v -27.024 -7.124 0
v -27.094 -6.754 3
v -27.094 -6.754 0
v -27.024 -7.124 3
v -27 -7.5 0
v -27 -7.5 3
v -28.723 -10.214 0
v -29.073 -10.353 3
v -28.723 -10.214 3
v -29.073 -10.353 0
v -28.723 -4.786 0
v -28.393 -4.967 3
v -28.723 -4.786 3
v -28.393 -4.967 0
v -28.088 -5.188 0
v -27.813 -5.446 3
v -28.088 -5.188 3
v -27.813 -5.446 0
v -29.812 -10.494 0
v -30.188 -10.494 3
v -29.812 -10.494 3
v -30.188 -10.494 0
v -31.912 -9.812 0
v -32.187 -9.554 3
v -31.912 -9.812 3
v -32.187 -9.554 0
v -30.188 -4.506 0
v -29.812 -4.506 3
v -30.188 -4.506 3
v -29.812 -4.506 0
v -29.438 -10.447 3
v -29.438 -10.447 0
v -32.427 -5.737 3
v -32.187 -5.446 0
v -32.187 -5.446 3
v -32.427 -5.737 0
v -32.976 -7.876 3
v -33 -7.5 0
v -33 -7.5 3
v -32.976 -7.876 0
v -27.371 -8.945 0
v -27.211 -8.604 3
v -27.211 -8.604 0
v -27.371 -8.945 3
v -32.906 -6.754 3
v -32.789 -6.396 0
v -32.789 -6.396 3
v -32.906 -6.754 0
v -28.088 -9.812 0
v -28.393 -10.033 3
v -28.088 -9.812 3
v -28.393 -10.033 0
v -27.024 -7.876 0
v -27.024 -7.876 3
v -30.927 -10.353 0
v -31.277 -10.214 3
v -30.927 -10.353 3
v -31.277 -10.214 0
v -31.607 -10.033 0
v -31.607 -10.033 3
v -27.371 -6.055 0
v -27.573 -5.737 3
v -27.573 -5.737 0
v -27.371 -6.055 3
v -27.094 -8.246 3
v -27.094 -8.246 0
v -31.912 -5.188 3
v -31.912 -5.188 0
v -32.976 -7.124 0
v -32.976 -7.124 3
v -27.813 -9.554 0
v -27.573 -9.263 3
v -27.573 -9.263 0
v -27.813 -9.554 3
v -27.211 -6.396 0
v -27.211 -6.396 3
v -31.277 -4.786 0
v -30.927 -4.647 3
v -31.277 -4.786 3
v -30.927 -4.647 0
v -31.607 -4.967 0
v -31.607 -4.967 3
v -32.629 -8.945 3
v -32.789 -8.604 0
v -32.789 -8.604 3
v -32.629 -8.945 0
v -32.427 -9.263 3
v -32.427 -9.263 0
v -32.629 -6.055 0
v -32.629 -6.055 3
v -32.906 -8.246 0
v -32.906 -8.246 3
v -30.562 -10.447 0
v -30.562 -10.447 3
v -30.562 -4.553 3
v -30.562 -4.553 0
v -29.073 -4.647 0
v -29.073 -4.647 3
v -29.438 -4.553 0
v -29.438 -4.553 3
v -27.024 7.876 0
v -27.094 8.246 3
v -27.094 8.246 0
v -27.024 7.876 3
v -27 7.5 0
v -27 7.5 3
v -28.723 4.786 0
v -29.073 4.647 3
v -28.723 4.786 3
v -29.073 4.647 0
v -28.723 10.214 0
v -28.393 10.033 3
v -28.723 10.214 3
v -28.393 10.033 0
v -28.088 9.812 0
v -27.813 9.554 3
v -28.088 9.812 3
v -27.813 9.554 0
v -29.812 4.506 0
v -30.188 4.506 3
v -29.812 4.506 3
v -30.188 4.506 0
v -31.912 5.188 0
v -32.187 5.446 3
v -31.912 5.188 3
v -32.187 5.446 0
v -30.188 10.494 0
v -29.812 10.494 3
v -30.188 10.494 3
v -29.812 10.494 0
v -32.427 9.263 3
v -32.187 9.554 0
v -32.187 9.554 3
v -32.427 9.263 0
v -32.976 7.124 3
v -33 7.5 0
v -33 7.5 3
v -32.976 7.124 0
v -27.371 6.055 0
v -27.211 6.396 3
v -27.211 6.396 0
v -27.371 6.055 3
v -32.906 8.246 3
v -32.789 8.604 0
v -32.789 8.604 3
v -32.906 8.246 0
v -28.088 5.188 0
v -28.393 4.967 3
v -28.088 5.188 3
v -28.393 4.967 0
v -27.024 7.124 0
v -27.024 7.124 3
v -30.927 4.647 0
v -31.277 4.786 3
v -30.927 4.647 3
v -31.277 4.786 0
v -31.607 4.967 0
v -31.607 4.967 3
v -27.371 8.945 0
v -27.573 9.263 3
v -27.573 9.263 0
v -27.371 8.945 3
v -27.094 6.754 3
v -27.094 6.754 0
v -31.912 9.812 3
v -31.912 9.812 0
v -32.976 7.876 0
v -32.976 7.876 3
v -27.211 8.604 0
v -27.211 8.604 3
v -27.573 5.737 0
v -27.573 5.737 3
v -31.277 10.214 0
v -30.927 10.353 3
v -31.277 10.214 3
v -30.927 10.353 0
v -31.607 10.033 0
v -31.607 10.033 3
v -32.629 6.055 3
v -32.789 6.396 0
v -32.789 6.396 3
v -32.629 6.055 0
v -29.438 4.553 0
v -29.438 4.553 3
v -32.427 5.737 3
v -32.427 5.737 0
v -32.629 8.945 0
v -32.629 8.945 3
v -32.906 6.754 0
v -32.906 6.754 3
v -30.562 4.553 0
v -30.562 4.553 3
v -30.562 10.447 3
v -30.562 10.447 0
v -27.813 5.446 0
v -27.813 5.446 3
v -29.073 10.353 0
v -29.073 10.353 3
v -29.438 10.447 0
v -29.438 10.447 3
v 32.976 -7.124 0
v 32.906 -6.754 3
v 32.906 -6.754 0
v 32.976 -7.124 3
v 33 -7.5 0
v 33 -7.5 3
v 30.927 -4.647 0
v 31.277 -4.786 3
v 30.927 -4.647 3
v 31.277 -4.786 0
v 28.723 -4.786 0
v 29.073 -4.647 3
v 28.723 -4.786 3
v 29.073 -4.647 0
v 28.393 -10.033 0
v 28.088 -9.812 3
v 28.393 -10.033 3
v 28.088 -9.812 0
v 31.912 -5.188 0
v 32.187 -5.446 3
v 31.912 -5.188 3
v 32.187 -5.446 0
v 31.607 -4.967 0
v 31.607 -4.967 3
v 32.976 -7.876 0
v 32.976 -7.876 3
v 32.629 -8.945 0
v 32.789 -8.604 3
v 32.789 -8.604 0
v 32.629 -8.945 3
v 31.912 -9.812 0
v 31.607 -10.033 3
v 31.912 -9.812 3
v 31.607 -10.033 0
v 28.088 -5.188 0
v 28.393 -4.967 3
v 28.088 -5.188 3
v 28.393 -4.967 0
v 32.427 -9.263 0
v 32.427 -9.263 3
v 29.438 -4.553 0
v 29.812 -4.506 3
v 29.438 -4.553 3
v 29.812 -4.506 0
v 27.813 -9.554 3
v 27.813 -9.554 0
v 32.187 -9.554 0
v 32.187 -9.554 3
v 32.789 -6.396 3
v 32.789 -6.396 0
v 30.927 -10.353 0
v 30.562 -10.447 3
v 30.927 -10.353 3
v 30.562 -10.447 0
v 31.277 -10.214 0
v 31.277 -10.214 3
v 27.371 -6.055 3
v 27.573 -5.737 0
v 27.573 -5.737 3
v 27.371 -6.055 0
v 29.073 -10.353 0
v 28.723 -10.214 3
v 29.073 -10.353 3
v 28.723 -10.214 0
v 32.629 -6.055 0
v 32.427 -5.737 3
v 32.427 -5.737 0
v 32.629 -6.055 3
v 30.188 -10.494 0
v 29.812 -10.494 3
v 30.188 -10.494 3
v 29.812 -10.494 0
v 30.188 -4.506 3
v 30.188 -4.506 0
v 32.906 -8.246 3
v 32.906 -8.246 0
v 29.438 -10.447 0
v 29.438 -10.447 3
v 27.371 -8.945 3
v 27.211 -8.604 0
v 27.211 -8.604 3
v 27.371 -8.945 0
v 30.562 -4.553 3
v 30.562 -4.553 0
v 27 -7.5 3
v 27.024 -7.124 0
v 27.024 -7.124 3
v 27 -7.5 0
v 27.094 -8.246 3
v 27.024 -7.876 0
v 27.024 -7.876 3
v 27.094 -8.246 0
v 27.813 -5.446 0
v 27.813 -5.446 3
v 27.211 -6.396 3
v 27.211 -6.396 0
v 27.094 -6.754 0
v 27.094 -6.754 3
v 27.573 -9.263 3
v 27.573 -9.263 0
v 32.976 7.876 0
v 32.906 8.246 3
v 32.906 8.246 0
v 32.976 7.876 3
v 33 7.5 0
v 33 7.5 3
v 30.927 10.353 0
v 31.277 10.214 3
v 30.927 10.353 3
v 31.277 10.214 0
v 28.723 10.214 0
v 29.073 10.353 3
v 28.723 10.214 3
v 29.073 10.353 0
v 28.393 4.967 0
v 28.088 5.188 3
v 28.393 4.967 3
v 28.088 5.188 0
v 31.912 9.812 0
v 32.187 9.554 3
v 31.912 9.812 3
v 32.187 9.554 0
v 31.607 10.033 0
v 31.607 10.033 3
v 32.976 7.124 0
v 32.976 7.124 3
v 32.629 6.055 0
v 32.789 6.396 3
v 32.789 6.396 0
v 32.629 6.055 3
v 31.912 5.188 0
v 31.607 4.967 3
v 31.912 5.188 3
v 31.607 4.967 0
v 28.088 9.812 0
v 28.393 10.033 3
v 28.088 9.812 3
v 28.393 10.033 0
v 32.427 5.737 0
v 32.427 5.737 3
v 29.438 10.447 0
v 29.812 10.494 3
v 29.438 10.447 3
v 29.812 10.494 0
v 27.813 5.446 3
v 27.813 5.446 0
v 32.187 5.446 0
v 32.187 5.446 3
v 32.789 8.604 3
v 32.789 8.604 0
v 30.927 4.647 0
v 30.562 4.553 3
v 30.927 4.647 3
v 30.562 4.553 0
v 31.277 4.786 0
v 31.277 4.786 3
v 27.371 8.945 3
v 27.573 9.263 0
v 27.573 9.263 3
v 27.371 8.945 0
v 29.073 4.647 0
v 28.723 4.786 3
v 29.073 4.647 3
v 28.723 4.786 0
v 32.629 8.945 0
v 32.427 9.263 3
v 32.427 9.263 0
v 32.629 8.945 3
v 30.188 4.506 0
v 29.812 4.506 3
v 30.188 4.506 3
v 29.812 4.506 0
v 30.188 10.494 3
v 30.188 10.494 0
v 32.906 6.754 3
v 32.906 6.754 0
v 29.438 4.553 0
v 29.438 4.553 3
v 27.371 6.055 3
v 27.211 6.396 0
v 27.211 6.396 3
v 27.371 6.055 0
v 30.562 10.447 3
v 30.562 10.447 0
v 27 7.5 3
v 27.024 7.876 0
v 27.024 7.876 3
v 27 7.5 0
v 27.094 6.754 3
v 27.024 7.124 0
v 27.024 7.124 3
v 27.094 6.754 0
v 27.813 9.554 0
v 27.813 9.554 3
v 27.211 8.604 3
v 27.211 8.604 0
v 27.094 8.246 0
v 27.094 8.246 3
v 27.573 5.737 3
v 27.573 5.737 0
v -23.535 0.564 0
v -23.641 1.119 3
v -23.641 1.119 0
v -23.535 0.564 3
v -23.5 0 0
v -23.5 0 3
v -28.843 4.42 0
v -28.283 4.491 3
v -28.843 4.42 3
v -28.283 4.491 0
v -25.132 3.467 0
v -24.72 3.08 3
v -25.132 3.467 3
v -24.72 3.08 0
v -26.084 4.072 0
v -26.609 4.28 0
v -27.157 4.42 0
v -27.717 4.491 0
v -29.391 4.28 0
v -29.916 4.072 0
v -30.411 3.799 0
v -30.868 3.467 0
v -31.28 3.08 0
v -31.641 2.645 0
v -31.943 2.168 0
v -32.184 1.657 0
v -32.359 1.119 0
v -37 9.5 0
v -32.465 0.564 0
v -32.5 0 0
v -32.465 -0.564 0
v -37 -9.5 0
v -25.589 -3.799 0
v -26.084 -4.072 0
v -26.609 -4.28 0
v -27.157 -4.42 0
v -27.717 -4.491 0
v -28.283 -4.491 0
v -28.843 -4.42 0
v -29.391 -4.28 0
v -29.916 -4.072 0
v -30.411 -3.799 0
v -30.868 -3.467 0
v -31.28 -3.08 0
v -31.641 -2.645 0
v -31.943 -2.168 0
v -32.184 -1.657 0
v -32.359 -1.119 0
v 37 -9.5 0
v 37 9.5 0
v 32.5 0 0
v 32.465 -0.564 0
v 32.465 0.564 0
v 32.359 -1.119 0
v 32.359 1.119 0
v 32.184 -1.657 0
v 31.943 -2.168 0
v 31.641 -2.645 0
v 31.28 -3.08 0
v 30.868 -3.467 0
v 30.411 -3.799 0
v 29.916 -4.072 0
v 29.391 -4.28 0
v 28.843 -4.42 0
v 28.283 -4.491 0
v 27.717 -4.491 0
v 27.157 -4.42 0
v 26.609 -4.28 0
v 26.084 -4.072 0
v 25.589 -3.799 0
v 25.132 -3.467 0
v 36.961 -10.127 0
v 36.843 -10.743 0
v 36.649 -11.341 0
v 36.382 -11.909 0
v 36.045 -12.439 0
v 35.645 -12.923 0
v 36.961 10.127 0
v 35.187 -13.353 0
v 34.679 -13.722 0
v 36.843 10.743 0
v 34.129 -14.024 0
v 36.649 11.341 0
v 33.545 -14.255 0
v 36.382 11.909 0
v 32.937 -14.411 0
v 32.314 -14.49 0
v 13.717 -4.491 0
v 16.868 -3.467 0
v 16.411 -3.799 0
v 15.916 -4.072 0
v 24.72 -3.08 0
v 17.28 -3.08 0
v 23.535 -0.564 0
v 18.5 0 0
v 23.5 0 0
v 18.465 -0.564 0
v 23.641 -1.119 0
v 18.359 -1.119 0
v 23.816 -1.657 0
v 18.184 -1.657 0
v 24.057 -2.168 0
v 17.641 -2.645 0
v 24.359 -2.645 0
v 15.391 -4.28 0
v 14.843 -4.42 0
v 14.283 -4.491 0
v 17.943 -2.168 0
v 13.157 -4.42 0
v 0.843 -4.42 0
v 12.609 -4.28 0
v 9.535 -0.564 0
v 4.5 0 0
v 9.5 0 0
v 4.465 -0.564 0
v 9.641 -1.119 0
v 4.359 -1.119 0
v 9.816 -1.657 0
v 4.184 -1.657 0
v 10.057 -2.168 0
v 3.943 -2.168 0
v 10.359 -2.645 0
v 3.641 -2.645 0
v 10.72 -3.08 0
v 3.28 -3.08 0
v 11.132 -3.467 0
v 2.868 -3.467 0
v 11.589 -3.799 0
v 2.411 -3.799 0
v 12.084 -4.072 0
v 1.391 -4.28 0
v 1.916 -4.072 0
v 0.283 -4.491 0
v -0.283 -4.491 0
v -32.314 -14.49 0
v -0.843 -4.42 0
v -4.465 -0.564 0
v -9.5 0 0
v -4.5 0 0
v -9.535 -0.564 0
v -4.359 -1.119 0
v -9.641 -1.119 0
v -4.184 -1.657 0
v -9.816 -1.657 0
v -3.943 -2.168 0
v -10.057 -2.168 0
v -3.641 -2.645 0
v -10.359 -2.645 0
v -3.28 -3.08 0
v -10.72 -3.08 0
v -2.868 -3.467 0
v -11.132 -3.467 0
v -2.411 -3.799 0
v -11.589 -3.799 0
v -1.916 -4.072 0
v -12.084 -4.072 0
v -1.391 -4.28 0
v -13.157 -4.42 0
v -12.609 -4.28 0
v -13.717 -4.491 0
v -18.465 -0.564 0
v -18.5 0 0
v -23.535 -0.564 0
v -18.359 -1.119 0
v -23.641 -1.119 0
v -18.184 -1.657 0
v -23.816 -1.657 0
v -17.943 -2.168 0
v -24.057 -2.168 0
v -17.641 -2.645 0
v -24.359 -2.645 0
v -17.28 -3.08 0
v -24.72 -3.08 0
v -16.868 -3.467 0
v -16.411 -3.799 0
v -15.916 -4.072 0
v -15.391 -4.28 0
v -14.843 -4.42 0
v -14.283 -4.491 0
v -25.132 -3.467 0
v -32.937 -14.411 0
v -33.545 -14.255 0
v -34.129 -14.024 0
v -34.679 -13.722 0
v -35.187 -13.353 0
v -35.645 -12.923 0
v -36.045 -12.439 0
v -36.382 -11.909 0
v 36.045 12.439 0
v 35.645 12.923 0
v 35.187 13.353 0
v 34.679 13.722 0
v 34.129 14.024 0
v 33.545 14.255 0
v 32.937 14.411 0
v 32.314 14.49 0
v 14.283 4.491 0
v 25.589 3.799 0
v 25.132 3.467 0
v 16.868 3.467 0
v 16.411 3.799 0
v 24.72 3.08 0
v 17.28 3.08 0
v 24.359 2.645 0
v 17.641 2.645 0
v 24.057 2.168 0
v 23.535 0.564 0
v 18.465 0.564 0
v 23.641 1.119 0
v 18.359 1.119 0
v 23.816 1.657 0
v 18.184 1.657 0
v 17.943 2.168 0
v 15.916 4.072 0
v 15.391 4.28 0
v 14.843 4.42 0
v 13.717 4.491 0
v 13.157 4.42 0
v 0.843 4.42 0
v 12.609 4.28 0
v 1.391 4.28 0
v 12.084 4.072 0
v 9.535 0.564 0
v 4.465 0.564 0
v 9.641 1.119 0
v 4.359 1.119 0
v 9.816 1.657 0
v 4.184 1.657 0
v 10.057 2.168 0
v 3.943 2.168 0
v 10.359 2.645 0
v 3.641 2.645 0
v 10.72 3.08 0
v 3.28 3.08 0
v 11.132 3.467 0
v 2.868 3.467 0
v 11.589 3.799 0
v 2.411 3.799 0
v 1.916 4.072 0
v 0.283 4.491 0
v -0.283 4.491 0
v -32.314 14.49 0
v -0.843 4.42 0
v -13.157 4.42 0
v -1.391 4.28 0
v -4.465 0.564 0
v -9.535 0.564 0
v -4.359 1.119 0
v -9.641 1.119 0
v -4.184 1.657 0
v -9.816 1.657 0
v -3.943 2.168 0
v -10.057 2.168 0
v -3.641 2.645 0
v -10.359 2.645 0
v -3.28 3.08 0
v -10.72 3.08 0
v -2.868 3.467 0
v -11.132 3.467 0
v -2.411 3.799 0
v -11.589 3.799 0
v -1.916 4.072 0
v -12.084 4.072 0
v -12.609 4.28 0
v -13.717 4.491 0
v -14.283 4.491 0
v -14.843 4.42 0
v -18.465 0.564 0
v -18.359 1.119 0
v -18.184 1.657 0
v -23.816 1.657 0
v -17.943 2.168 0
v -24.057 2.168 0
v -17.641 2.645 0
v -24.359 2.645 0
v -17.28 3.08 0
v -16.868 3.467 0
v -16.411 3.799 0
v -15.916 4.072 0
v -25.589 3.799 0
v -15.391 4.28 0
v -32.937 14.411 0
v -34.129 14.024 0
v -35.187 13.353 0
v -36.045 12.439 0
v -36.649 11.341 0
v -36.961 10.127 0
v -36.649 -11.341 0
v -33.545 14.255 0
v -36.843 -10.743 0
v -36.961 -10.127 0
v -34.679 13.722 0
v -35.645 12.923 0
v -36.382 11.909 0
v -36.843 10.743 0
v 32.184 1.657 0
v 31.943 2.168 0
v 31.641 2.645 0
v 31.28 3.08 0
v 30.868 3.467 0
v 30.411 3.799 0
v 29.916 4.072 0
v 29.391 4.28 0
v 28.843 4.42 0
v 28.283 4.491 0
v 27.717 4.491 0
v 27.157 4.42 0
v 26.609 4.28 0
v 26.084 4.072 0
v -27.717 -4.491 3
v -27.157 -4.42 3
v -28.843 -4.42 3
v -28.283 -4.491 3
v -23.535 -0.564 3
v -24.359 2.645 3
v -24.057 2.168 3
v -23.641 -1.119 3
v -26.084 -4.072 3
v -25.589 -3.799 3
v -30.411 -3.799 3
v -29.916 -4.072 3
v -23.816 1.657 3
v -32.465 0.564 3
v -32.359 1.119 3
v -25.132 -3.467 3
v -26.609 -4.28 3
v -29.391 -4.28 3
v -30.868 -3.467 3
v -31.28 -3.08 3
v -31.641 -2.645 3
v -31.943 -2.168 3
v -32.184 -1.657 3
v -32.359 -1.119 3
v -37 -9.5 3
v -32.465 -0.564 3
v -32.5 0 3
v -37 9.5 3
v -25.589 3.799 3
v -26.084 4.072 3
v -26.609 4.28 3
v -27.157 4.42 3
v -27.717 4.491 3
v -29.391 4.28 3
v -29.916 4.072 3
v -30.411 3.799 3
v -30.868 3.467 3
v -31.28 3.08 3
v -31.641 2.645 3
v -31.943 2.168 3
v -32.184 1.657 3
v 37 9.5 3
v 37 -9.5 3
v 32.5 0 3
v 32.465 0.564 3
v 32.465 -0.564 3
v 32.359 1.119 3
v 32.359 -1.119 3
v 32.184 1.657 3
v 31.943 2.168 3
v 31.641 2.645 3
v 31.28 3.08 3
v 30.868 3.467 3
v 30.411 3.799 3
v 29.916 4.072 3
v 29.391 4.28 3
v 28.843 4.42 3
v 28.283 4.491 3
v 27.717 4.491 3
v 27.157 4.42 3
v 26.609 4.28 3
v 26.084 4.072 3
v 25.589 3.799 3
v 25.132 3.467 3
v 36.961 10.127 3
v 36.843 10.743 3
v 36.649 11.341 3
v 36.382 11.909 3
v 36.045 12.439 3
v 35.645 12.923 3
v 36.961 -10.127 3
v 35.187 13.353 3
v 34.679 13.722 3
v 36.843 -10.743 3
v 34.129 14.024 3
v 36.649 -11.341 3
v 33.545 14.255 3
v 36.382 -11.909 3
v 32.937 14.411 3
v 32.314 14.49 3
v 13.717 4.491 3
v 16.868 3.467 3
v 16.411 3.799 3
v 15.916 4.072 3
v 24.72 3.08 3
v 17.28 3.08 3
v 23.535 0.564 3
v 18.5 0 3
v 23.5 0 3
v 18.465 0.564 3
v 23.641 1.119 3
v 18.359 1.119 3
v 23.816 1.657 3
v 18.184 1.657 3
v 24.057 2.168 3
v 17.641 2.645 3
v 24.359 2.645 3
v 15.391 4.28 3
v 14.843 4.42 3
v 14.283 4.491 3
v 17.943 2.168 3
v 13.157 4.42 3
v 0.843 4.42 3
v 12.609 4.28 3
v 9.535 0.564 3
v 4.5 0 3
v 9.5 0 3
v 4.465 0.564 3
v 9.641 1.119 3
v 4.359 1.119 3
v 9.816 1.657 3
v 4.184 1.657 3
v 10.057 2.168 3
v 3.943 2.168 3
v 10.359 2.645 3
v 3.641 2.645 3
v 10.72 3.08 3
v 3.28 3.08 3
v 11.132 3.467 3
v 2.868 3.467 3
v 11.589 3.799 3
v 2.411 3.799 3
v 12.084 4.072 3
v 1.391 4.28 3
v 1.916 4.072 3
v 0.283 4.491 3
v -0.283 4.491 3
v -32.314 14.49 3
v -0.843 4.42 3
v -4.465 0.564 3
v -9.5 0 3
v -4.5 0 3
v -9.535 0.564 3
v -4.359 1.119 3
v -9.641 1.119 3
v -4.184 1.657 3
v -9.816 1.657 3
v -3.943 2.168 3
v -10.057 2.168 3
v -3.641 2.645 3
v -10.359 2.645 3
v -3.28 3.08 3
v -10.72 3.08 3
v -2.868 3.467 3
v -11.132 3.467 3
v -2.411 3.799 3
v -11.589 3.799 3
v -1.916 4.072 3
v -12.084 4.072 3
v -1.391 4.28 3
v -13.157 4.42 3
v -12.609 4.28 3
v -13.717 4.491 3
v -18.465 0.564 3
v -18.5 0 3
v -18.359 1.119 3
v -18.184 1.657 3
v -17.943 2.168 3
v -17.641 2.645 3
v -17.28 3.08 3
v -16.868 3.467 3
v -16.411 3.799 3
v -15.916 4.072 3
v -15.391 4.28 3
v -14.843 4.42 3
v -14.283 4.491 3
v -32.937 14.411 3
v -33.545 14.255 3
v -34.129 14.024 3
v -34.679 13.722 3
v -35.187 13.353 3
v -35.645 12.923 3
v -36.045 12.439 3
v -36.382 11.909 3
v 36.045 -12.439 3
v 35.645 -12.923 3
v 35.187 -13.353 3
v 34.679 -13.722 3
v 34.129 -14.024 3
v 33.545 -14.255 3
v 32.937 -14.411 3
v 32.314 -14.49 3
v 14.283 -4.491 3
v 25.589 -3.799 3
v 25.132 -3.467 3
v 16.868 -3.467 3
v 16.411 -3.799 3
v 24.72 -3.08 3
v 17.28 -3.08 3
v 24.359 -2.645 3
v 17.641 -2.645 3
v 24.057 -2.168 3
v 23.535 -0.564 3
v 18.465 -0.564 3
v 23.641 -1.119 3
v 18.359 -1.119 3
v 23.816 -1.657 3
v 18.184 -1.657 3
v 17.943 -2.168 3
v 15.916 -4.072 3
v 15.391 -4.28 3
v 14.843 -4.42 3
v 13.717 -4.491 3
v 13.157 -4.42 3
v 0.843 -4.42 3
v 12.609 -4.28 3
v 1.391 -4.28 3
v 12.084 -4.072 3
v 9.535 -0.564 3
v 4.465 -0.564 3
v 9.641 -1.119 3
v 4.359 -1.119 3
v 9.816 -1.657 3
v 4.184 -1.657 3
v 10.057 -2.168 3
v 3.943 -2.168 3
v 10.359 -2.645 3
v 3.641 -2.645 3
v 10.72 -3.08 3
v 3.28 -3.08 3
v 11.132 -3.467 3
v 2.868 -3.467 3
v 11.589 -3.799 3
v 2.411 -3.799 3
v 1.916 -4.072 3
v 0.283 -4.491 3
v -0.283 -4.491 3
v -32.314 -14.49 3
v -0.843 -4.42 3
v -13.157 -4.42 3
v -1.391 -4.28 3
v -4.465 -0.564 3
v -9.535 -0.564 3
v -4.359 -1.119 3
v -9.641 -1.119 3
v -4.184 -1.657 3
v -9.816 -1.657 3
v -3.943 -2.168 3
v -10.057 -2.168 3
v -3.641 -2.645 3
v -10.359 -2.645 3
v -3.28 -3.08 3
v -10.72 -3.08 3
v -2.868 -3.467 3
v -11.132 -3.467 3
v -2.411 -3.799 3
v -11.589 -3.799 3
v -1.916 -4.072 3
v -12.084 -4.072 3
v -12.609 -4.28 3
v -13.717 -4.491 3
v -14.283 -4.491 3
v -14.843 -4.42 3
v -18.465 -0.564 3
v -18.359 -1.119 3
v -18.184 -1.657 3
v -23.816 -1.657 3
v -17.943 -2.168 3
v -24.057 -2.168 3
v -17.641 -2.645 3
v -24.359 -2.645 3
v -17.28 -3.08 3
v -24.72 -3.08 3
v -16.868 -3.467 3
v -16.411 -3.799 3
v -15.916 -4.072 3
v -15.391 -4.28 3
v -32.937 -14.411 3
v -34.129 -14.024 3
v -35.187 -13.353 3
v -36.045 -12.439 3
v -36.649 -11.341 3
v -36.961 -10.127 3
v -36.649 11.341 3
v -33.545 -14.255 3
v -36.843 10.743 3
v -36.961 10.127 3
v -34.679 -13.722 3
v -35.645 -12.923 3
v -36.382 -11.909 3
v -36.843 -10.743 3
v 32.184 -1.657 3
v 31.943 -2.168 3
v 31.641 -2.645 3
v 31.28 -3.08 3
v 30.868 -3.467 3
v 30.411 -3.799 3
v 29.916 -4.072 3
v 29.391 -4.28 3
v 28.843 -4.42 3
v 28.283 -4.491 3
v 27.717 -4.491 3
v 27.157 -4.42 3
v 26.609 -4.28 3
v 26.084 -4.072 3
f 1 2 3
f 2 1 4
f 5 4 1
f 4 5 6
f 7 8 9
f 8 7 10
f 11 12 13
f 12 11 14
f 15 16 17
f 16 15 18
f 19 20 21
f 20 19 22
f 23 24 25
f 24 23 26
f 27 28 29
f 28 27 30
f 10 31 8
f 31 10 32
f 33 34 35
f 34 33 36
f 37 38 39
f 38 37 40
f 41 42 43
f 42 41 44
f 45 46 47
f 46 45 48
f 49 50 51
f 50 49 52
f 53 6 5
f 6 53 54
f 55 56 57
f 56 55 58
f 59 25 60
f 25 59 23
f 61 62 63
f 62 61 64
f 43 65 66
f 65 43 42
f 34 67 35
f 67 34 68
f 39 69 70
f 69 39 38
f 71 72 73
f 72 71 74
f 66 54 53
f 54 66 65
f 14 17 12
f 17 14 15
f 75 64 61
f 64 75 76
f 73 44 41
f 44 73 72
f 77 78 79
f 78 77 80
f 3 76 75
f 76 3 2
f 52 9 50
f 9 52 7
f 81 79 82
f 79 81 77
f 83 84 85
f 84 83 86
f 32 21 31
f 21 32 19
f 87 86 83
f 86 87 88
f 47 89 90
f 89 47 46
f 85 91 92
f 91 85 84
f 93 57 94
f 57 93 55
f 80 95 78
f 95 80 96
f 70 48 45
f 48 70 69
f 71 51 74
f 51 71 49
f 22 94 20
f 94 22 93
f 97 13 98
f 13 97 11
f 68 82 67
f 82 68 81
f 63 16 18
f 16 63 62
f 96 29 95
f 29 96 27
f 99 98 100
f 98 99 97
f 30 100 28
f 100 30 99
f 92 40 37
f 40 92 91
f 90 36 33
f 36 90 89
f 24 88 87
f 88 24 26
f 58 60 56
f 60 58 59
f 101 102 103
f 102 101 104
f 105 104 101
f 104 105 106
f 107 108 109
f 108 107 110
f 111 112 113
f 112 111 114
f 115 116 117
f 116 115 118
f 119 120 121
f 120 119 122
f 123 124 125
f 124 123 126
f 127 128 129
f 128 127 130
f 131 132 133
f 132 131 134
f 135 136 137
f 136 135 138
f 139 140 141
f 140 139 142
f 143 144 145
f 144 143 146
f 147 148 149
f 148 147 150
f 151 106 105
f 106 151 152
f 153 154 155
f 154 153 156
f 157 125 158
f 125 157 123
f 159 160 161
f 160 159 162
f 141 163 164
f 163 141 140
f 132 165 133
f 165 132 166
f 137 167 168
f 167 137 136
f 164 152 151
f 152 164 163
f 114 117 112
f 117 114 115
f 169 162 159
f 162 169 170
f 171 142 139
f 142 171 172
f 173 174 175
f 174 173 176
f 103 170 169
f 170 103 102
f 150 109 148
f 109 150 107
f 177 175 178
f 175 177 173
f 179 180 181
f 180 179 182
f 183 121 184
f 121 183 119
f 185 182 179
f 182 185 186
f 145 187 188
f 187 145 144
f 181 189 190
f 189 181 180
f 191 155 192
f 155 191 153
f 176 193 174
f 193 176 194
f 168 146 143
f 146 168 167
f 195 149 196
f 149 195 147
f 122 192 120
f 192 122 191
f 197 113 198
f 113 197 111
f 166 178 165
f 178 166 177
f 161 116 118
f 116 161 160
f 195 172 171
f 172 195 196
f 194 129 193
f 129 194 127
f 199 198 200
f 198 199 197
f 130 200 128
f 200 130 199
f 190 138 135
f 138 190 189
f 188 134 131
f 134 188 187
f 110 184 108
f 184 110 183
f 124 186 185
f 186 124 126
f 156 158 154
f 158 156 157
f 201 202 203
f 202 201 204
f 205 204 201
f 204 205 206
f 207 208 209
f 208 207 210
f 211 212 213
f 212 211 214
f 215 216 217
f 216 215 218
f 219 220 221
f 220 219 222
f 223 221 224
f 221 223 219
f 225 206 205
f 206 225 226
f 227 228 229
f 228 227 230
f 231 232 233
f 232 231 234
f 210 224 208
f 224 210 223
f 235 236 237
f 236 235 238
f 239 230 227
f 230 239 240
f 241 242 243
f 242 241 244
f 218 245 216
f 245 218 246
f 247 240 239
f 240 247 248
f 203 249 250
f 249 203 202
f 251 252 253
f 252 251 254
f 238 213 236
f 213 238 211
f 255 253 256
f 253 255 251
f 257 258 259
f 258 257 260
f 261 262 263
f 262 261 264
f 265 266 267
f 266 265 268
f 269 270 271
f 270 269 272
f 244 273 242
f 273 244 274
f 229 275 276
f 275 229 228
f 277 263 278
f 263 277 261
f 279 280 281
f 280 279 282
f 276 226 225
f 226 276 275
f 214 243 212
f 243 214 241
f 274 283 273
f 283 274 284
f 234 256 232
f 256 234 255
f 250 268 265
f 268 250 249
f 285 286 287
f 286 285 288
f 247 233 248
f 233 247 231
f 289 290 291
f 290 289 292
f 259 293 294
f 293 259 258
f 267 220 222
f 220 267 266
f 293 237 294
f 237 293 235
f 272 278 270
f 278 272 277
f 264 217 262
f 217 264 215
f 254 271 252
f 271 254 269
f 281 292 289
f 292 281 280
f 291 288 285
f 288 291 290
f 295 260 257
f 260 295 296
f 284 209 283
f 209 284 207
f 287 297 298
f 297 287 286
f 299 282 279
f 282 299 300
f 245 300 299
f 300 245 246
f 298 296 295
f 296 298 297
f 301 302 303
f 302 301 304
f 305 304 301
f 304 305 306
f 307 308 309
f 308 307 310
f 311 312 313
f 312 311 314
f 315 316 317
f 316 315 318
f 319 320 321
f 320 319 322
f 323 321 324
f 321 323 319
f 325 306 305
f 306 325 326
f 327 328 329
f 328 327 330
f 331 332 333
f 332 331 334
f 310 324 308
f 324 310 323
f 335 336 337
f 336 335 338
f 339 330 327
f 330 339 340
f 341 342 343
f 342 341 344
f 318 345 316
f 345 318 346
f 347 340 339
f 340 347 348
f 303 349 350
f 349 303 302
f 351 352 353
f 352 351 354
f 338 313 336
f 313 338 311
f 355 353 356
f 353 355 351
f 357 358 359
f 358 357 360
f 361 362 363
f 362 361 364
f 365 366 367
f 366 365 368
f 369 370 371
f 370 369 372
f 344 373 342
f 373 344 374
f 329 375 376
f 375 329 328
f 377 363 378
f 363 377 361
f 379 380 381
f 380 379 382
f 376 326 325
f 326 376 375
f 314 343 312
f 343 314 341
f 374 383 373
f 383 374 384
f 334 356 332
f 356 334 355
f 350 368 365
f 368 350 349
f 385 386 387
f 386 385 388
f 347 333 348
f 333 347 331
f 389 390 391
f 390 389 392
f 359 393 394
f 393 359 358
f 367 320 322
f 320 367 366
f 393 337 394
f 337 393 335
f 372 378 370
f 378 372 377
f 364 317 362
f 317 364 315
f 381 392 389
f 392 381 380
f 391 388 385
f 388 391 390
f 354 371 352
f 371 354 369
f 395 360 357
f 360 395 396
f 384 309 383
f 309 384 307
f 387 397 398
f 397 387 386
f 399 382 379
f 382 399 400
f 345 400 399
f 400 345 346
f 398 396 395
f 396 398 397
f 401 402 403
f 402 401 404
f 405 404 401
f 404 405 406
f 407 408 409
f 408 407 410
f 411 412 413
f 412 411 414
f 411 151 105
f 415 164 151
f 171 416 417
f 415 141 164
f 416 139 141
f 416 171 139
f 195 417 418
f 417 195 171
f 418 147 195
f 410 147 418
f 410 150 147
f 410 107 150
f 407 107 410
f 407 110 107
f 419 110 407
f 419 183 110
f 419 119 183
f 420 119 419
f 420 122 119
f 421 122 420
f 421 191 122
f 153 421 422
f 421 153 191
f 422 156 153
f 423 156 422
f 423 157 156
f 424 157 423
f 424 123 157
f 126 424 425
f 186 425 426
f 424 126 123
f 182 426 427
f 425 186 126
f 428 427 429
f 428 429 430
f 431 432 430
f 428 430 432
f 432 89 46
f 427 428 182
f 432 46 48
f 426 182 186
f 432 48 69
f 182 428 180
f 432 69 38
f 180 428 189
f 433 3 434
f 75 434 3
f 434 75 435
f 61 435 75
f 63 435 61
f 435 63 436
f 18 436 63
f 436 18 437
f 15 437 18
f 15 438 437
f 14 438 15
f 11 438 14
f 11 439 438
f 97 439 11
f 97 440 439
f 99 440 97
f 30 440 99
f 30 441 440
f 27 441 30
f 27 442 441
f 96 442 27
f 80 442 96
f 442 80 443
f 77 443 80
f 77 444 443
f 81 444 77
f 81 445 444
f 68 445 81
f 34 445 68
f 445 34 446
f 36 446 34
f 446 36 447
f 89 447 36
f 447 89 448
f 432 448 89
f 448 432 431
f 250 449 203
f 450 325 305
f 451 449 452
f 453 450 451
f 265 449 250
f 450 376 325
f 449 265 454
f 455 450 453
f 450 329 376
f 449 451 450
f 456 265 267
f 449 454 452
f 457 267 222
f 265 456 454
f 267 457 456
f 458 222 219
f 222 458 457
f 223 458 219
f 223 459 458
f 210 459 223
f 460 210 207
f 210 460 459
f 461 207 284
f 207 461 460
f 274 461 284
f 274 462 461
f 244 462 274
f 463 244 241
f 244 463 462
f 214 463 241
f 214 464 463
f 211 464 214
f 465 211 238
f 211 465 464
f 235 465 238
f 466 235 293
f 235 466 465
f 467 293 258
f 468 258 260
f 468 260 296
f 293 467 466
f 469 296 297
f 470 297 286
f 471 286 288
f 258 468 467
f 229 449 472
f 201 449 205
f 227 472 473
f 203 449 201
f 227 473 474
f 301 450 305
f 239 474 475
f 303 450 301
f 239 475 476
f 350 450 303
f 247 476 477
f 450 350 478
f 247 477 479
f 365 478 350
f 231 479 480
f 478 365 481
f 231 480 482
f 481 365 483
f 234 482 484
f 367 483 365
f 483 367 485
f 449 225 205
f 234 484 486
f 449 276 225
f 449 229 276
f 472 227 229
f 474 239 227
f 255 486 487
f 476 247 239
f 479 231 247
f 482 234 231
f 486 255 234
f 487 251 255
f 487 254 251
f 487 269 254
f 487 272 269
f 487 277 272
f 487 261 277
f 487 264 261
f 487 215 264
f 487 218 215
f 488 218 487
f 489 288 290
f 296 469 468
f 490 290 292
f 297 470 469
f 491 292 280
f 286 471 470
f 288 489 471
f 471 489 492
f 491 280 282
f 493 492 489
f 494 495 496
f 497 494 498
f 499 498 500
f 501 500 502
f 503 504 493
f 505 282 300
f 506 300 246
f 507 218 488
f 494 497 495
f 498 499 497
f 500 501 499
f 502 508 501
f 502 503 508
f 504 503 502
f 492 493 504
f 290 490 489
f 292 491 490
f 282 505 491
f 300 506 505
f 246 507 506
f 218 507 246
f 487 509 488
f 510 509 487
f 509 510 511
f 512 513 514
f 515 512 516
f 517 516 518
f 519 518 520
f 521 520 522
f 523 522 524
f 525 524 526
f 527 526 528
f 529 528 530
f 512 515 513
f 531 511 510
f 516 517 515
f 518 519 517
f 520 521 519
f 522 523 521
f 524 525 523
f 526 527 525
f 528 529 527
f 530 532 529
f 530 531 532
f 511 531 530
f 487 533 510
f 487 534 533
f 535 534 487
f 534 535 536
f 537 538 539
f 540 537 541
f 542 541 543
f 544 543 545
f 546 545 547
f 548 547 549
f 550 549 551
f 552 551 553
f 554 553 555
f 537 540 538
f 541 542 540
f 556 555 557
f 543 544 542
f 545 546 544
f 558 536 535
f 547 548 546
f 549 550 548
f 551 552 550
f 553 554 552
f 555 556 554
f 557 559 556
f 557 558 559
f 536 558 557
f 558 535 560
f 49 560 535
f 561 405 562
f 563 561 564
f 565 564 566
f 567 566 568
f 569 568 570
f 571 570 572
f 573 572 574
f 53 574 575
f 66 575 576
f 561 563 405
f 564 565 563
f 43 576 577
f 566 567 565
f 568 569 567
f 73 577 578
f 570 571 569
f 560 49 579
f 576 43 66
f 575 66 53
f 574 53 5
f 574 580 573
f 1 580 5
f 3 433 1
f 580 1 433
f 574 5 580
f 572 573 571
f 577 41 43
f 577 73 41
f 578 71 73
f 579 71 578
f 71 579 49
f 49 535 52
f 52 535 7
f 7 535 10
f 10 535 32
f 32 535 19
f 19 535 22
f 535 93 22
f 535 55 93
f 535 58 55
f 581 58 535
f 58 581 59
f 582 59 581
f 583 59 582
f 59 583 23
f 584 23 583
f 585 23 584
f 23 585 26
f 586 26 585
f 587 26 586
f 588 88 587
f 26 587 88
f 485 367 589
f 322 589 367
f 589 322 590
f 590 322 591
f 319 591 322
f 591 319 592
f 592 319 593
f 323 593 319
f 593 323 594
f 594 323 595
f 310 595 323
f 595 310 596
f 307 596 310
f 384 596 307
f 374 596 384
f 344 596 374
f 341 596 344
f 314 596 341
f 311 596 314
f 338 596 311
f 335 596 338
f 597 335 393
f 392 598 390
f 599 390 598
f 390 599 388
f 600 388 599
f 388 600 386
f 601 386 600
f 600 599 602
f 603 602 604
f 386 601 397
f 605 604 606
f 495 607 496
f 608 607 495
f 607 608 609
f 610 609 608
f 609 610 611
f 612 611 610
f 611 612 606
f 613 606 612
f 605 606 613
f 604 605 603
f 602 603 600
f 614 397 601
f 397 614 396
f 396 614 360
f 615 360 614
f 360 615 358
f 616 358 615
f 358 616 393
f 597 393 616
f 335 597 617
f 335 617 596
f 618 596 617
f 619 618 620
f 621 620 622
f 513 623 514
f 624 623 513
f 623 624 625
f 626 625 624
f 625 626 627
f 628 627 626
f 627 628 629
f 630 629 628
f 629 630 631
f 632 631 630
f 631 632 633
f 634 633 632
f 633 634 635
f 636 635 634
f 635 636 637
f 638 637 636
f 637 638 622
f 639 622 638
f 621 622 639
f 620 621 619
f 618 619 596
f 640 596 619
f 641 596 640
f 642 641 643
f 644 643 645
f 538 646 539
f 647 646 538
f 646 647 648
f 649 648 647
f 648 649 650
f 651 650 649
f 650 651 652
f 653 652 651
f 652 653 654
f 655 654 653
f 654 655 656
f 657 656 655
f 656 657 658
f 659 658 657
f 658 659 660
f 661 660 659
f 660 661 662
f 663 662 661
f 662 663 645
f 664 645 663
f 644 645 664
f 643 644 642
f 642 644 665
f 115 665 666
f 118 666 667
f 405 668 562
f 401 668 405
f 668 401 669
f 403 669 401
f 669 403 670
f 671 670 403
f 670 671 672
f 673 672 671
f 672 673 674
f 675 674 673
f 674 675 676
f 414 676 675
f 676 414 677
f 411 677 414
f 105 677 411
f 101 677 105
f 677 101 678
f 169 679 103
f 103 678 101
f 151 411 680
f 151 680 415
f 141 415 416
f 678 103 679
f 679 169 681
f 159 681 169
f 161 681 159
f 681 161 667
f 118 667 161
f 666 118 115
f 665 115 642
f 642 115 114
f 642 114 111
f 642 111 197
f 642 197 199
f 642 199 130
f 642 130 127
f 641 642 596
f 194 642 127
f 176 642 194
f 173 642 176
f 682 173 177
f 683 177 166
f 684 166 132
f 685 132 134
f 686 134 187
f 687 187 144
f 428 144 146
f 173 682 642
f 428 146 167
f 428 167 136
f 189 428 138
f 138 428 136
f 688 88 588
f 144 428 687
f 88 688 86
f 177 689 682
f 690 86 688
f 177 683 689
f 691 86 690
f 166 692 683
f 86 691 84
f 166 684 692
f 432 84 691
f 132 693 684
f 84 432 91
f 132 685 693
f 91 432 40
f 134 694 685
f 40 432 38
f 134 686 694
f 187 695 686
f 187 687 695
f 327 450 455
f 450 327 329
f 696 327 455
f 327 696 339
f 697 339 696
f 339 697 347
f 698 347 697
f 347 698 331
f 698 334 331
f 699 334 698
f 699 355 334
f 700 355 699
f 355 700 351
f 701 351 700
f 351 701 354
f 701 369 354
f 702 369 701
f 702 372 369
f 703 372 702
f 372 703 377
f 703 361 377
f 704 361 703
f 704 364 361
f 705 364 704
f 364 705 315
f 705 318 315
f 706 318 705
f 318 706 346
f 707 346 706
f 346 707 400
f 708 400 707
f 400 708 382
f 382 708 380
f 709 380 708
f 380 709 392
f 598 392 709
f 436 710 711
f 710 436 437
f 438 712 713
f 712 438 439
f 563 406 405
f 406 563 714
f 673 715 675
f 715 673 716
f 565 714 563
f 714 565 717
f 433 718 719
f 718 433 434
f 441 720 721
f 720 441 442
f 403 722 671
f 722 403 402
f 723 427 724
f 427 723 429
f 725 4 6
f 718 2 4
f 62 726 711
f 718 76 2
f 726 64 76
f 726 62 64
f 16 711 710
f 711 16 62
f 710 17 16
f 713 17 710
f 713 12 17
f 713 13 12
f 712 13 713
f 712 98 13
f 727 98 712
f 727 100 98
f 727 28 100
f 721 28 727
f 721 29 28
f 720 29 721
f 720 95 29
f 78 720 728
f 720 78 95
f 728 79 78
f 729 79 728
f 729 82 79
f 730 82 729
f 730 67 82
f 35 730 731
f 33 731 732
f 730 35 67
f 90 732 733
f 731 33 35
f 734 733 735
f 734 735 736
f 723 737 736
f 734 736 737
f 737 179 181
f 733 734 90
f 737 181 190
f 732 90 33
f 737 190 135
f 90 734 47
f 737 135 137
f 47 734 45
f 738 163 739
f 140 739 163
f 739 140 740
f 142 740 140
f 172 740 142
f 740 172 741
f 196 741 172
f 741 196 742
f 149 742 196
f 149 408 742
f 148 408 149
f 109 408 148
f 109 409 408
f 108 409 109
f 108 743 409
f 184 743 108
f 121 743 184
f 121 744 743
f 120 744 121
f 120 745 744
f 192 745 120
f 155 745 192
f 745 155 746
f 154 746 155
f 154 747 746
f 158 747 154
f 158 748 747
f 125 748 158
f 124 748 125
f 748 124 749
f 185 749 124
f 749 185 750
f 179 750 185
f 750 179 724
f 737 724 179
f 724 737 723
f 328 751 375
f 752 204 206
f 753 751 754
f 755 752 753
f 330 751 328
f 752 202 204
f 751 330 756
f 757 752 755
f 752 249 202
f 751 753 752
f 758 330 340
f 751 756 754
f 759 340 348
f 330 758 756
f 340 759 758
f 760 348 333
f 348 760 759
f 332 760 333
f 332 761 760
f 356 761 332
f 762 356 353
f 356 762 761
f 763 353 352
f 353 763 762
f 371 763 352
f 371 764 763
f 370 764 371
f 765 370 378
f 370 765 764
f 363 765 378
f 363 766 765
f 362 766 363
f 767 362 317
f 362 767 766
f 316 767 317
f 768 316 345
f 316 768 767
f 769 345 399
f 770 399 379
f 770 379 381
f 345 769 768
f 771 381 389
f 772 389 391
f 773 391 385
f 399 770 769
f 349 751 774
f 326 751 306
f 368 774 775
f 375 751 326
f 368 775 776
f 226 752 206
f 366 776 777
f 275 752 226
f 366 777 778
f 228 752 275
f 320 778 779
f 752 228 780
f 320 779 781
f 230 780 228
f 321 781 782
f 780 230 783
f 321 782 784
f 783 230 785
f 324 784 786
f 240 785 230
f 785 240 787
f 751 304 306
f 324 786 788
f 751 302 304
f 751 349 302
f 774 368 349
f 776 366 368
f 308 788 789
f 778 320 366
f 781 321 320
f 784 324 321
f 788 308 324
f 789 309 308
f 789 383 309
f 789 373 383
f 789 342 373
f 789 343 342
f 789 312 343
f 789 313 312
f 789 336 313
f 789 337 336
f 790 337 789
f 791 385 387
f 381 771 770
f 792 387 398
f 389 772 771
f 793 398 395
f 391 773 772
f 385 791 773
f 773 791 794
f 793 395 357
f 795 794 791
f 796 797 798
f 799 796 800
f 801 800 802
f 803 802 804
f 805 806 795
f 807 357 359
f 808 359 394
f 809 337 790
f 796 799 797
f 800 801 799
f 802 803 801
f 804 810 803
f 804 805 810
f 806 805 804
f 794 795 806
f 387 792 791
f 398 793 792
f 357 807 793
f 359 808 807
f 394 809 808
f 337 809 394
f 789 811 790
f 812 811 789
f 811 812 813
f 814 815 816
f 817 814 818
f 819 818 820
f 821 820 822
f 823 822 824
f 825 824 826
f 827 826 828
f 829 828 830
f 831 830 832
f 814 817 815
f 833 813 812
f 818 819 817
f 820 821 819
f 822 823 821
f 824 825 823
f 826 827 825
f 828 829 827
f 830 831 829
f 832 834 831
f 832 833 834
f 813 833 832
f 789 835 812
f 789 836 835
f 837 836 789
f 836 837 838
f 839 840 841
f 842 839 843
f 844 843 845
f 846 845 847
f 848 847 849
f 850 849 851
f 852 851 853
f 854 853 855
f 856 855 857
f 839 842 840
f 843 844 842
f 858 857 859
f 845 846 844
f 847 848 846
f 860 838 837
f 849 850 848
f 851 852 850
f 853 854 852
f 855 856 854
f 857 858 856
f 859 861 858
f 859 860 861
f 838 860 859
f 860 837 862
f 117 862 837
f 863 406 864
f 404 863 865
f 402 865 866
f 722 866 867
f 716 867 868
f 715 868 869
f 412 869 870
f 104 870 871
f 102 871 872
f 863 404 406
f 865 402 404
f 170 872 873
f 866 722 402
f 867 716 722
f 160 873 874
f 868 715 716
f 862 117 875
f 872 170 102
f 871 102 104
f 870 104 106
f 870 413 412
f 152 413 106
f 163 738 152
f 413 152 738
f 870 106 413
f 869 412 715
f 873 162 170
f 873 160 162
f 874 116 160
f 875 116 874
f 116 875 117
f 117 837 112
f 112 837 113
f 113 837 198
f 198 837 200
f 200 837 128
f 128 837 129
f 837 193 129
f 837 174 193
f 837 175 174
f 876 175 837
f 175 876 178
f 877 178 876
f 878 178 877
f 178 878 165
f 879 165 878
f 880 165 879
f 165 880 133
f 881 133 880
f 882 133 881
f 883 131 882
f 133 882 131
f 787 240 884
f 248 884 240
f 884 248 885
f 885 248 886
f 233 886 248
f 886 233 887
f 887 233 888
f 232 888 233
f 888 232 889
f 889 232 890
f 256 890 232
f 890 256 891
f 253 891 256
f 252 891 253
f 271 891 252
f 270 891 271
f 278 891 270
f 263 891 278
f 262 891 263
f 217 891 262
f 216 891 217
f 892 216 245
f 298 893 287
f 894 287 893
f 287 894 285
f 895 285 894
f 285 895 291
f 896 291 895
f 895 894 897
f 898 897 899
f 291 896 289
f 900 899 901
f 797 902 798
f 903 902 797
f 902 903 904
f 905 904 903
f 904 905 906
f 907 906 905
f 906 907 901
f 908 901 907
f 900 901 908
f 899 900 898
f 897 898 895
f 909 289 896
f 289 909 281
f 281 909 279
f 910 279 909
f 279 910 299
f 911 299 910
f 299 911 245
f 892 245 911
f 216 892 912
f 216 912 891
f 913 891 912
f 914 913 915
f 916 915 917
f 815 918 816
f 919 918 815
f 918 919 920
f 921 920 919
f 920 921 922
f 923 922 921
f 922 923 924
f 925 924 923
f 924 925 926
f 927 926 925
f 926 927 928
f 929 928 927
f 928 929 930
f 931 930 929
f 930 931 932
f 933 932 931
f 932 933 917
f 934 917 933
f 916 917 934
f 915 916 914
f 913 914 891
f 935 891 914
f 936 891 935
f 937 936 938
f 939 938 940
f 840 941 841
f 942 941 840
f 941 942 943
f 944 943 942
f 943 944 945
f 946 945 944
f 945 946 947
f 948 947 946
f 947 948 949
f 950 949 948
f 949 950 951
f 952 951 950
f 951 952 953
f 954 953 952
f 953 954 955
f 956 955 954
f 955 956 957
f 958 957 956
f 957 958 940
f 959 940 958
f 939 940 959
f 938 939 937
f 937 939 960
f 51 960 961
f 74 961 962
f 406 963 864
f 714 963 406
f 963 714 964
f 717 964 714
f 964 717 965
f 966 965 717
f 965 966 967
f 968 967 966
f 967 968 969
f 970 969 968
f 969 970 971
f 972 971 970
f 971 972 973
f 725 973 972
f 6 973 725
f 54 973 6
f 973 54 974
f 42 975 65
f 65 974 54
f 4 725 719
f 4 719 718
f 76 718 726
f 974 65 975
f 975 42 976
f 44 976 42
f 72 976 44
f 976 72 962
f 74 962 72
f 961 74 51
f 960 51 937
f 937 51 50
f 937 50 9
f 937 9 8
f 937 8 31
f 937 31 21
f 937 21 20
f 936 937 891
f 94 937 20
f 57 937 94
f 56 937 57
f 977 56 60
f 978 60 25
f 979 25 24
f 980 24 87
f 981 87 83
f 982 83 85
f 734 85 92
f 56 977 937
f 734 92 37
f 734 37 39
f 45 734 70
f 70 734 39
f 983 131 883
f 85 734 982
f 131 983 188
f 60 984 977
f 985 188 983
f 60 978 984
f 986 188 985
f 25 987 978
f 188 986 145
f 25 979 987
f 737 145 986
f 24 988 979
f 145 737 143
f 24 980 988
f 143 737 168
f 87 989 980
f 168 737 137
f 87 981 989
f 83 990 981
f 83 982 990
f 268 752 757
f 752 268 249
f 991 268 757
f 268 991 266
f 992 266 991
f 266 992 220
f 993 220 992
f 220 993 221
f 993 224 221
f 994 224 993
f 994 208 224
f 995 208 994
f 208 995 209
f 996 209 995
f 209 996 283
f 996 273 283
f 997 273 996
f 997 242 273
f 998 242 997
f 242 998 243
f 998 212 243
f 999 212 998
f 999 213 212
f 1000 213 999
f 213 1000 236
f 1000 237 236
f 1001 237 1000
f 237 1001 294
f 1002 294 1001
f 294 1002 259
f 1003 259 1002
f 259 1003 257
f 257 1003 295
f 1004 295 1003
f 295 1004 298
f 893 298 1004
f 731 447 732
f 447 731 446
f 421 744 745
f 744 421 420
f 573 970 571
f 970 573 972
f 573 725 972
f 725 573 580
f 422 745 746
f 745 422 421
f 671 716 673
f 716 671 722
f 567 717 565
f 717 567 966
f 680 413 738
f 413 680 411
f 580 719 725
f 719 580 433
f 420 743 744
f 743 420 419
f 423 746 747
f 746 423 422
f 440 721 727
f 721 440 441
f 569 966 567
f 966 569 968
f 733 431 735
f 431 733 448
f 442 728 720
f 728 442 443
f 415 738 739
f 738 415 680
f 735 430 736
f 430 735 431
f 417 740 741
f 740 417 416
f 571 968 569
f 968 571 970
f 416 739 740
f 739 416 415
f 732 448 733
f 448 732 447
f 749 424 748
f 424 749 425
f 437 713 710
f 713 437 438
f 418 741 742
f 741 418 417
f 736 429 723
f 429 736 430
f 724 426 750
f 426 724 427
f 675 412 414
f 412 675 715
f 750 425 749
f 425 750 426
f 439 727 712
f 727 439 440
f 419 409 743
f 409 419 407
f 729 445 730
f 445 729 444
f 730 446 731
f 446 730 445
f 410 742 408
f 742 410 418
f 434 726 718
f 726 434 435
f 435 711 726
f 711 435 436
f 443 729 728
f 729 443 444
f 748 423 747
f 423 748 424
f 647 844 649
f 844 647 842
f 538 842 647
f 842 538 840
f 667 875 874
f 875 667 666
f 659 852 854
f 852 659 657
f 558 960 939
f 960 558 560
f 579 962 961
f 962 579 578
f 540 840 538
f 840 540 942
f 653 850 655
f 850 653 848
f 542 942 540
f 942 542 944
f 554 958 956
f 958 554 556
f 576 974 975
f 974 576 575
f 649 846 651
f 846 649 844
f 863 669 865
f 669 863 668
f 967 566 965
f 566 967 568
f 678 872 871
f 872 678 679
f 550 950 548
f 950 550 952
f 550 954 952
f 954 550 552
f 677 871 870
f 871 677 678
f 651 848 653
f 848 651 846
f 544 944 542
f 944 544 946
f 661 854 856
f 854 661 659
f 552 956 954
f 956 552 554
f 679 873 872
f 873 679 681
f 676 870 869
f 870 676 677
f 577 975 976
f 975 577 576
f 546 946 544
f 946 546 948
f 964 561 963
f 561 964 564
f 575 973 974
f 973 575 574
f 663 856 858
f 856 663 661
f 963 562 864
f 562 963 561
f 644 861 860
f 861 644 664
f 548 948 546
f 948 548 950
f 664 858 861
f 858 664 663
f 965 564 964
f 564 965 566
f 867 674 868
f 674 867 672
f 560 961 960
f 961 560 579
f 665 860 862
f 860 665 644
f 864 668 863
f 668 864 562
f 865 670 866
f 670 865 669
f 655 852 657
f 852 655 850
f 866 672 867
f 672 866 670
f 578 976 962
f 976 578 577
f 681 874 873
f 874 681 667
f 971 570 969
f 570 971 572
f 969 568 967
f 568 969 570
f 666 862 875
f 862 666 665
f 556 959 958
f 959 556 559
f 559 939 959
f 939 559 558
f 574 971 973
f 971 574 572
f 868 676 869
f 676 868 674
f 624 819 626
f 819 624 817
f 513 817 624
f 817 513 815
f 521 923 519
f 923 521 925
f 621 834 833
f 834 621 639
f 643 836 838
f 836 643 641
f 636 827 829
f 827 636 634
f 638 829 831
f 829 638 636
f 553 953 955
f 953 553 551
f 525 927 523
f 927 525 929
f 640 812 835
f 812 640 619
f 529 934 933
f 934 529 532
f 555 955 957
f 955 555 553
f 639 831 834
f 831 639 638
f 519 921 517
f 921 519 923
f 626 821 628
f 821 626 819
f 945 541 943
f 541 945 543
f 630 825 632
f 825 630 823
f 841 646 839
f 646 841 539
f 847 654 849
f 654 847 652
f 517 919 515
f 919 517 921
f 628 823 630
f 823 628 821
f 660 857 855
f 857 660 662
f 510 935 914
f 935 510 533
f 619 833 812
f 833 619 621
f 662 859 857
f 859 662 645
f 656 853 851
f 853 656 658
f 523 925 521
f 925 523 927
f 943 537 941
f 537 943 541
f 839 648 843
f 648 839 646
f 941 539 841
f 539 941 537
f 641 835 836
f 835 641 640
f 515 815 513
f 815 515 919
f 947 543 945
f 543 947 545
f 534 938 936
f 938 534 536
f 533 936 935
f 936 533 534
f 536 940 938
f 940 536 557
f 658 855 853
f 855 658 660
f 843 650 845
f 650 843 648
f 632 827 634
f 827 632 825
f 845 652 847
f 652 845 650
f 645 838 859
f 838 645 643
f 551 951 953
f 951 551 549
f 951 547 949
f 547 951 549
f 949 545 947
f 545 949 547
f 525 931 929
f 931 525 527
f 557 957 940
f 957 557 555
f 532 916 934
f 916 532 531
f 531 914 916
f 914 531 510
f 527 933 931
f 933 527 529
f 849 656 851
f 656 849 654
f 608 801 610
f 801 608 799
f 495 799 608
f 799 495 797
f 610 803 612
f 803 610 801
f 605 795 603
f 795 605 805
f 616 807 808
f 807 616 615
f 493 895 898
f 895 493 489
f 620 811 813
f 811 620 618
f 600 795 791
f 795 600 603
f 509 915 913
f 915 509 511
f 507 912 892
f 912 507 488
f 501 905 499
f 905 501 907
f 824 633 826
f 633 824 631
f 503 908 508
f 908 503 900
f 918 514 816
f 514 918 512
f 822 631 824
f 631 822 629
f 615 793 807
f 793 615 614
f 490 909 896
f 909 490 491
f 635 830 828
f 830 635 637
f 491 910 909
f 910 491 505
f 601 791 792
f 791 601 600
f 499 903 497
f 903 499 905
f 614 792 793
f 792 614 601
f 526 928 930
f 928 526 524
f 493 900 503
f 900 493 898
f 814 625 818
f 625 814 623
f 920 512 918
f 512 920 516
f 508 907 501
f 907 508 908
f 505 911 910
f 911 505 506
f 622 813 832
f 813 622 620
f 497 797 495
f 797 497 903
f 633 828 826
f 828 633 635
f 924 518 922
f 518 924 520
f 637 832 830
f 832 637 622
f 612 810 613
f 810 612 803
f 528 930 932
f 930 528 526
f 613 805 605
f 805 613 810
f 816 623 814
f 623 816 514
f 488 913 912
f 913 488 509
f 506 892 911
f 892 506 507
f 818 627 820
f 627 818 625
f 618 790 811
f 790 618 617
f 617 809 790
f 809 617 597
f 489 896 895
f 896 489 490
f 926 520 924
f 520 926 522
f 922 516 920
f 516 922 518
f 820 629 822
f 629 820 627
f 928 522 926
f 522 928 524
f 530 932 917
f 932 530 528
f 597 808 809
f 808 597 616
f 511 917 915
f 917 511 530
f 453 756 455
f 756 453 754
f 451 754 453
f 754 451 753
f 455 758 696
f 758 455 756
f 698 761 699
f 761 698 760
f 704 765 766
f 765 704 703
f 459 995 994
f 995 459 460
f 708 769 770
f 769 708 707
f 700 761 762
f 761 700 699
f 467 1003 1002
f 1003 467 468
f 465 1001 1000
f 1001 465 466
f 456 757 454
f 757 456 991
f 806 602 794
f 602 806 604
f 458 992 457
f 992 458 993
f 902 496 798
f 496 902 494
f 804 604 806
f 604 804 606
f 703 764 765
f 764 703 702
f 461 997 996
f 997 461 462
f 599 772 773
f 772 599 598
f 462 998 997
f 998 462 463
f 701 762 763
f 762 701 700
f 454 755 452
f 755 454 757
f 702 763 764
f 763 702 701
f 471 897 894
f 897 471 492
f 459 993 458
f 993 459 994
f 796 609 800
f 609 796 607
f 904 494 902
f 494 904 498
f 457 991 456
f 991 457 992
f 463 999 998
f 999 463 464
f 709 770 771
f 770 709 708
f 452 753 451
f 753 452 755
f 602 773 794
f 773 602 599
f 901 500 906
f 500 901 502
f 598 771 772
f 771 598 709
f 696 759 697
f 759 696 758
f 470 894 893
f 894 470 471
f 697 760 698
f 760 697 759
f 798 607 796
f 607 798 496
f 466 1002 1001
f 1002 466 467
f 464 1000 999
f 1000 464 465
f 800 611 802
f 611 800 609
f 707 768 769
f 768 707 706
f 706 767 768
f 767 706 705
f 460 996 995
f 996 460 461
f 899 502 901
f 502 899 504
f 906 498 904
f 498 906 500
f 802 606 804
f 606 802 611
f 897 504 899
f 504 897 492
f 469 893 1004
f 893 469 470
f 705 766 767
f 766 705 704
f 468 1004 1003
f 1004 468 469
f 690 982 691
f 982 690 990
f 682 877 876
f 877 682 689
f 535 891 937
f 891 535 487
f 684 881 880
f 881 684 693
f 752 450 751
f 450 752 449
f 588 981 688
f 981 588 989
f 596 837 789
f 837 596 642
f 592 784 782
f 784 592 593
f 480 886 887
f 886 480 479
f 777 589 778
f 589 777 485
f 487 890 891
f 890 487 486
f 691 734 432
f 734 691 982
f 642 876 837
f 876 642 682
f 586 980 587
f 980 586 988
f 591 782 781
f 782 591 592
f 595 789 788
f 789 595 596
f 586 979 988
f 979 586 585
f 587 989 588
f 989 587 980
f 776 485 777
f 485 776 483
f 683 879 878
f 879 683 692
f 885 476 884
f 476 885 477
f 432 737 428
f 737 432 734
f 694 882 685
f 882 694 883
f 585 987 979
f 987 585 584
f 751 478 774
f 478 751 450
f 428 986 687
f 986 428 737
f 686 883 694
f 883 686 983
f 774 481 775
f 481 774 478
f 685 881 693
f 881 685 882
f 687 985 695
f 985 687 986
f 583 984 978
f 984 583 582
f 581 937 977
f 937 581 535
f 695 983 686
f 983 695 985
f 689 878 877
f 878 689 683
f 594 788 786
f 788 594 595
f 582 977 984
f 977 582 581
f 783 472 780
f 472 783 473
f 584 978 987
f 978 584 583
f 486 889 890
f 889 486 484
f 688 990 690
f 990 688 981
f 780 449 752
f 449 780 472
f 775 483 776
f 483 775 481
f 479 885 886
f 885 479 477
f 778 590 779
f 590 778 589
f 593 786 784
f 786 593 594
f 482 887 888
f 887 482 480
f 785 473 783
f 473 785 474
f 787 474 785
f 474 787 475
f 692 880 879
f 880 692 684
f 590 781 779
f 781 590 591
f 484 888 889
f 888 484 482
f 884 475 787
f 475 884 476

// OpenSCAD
$fn = 50;


difference() {
	union() {
		hull() {
			translate(v = [-32.0000000000, 9.5000000000, 0]) {
				cylinder(h = 3, r = 5);
			}
			translate(v = [32.0000000000, 9.5000000000, 0]) {
				cylinder(h = 3, r = 5);
			}
			translate(v = [-32.0000000000, -9.5000000000, 0]) {
				cylinder(h = 3, r = 5);
			}
			translate(v = [32.0000000000, -9.5000000000, 0]) {
				cylinder(h = 3, r = 5);
			}
		}
	}
	union() {
		#translate(v = [-30.0000000000, -7.5000000000, -100.0000000000]) {
			cylinder(h = 200, r = 3.0000000000);
		}
		#translate(v = [-30.0000000000, 7.5000000000, -100.0000000000]) {
			cylinder(h = 200, r = 3.0000000000);
		}
		#translate(v = [30.0000000000, -7.5000000000, -100.0000000000]) {
			cylinder(h = 200, r = 3.0000000000);
		}
		#translate(v = [30.0000000000, 7.5000000000, -100.0000000000]) {
			cylinder(h = 200, r = 3.0000000000);
		}
		#translate(v = [-28.0000000000, 0, 0]) {
			cylinder(h = 3, r = 4.5000000000);
		}
		#translate(v = [-14.0000000000, 0, 0]) {
			cylinder(h = 3, r = 4.5000000000);
		}
		#cylinder(h = 3, r = 4.5000000000);
		#translate(v = [14.0000000000, 0, 0]) {
			cylinder(h = 3, r = 4.5000000000);
		}
		#translate(v = [28.0000000000, 0, 0]) {
			cylinder(h = 3, r = 4.5000000000);
		}
	}
}
